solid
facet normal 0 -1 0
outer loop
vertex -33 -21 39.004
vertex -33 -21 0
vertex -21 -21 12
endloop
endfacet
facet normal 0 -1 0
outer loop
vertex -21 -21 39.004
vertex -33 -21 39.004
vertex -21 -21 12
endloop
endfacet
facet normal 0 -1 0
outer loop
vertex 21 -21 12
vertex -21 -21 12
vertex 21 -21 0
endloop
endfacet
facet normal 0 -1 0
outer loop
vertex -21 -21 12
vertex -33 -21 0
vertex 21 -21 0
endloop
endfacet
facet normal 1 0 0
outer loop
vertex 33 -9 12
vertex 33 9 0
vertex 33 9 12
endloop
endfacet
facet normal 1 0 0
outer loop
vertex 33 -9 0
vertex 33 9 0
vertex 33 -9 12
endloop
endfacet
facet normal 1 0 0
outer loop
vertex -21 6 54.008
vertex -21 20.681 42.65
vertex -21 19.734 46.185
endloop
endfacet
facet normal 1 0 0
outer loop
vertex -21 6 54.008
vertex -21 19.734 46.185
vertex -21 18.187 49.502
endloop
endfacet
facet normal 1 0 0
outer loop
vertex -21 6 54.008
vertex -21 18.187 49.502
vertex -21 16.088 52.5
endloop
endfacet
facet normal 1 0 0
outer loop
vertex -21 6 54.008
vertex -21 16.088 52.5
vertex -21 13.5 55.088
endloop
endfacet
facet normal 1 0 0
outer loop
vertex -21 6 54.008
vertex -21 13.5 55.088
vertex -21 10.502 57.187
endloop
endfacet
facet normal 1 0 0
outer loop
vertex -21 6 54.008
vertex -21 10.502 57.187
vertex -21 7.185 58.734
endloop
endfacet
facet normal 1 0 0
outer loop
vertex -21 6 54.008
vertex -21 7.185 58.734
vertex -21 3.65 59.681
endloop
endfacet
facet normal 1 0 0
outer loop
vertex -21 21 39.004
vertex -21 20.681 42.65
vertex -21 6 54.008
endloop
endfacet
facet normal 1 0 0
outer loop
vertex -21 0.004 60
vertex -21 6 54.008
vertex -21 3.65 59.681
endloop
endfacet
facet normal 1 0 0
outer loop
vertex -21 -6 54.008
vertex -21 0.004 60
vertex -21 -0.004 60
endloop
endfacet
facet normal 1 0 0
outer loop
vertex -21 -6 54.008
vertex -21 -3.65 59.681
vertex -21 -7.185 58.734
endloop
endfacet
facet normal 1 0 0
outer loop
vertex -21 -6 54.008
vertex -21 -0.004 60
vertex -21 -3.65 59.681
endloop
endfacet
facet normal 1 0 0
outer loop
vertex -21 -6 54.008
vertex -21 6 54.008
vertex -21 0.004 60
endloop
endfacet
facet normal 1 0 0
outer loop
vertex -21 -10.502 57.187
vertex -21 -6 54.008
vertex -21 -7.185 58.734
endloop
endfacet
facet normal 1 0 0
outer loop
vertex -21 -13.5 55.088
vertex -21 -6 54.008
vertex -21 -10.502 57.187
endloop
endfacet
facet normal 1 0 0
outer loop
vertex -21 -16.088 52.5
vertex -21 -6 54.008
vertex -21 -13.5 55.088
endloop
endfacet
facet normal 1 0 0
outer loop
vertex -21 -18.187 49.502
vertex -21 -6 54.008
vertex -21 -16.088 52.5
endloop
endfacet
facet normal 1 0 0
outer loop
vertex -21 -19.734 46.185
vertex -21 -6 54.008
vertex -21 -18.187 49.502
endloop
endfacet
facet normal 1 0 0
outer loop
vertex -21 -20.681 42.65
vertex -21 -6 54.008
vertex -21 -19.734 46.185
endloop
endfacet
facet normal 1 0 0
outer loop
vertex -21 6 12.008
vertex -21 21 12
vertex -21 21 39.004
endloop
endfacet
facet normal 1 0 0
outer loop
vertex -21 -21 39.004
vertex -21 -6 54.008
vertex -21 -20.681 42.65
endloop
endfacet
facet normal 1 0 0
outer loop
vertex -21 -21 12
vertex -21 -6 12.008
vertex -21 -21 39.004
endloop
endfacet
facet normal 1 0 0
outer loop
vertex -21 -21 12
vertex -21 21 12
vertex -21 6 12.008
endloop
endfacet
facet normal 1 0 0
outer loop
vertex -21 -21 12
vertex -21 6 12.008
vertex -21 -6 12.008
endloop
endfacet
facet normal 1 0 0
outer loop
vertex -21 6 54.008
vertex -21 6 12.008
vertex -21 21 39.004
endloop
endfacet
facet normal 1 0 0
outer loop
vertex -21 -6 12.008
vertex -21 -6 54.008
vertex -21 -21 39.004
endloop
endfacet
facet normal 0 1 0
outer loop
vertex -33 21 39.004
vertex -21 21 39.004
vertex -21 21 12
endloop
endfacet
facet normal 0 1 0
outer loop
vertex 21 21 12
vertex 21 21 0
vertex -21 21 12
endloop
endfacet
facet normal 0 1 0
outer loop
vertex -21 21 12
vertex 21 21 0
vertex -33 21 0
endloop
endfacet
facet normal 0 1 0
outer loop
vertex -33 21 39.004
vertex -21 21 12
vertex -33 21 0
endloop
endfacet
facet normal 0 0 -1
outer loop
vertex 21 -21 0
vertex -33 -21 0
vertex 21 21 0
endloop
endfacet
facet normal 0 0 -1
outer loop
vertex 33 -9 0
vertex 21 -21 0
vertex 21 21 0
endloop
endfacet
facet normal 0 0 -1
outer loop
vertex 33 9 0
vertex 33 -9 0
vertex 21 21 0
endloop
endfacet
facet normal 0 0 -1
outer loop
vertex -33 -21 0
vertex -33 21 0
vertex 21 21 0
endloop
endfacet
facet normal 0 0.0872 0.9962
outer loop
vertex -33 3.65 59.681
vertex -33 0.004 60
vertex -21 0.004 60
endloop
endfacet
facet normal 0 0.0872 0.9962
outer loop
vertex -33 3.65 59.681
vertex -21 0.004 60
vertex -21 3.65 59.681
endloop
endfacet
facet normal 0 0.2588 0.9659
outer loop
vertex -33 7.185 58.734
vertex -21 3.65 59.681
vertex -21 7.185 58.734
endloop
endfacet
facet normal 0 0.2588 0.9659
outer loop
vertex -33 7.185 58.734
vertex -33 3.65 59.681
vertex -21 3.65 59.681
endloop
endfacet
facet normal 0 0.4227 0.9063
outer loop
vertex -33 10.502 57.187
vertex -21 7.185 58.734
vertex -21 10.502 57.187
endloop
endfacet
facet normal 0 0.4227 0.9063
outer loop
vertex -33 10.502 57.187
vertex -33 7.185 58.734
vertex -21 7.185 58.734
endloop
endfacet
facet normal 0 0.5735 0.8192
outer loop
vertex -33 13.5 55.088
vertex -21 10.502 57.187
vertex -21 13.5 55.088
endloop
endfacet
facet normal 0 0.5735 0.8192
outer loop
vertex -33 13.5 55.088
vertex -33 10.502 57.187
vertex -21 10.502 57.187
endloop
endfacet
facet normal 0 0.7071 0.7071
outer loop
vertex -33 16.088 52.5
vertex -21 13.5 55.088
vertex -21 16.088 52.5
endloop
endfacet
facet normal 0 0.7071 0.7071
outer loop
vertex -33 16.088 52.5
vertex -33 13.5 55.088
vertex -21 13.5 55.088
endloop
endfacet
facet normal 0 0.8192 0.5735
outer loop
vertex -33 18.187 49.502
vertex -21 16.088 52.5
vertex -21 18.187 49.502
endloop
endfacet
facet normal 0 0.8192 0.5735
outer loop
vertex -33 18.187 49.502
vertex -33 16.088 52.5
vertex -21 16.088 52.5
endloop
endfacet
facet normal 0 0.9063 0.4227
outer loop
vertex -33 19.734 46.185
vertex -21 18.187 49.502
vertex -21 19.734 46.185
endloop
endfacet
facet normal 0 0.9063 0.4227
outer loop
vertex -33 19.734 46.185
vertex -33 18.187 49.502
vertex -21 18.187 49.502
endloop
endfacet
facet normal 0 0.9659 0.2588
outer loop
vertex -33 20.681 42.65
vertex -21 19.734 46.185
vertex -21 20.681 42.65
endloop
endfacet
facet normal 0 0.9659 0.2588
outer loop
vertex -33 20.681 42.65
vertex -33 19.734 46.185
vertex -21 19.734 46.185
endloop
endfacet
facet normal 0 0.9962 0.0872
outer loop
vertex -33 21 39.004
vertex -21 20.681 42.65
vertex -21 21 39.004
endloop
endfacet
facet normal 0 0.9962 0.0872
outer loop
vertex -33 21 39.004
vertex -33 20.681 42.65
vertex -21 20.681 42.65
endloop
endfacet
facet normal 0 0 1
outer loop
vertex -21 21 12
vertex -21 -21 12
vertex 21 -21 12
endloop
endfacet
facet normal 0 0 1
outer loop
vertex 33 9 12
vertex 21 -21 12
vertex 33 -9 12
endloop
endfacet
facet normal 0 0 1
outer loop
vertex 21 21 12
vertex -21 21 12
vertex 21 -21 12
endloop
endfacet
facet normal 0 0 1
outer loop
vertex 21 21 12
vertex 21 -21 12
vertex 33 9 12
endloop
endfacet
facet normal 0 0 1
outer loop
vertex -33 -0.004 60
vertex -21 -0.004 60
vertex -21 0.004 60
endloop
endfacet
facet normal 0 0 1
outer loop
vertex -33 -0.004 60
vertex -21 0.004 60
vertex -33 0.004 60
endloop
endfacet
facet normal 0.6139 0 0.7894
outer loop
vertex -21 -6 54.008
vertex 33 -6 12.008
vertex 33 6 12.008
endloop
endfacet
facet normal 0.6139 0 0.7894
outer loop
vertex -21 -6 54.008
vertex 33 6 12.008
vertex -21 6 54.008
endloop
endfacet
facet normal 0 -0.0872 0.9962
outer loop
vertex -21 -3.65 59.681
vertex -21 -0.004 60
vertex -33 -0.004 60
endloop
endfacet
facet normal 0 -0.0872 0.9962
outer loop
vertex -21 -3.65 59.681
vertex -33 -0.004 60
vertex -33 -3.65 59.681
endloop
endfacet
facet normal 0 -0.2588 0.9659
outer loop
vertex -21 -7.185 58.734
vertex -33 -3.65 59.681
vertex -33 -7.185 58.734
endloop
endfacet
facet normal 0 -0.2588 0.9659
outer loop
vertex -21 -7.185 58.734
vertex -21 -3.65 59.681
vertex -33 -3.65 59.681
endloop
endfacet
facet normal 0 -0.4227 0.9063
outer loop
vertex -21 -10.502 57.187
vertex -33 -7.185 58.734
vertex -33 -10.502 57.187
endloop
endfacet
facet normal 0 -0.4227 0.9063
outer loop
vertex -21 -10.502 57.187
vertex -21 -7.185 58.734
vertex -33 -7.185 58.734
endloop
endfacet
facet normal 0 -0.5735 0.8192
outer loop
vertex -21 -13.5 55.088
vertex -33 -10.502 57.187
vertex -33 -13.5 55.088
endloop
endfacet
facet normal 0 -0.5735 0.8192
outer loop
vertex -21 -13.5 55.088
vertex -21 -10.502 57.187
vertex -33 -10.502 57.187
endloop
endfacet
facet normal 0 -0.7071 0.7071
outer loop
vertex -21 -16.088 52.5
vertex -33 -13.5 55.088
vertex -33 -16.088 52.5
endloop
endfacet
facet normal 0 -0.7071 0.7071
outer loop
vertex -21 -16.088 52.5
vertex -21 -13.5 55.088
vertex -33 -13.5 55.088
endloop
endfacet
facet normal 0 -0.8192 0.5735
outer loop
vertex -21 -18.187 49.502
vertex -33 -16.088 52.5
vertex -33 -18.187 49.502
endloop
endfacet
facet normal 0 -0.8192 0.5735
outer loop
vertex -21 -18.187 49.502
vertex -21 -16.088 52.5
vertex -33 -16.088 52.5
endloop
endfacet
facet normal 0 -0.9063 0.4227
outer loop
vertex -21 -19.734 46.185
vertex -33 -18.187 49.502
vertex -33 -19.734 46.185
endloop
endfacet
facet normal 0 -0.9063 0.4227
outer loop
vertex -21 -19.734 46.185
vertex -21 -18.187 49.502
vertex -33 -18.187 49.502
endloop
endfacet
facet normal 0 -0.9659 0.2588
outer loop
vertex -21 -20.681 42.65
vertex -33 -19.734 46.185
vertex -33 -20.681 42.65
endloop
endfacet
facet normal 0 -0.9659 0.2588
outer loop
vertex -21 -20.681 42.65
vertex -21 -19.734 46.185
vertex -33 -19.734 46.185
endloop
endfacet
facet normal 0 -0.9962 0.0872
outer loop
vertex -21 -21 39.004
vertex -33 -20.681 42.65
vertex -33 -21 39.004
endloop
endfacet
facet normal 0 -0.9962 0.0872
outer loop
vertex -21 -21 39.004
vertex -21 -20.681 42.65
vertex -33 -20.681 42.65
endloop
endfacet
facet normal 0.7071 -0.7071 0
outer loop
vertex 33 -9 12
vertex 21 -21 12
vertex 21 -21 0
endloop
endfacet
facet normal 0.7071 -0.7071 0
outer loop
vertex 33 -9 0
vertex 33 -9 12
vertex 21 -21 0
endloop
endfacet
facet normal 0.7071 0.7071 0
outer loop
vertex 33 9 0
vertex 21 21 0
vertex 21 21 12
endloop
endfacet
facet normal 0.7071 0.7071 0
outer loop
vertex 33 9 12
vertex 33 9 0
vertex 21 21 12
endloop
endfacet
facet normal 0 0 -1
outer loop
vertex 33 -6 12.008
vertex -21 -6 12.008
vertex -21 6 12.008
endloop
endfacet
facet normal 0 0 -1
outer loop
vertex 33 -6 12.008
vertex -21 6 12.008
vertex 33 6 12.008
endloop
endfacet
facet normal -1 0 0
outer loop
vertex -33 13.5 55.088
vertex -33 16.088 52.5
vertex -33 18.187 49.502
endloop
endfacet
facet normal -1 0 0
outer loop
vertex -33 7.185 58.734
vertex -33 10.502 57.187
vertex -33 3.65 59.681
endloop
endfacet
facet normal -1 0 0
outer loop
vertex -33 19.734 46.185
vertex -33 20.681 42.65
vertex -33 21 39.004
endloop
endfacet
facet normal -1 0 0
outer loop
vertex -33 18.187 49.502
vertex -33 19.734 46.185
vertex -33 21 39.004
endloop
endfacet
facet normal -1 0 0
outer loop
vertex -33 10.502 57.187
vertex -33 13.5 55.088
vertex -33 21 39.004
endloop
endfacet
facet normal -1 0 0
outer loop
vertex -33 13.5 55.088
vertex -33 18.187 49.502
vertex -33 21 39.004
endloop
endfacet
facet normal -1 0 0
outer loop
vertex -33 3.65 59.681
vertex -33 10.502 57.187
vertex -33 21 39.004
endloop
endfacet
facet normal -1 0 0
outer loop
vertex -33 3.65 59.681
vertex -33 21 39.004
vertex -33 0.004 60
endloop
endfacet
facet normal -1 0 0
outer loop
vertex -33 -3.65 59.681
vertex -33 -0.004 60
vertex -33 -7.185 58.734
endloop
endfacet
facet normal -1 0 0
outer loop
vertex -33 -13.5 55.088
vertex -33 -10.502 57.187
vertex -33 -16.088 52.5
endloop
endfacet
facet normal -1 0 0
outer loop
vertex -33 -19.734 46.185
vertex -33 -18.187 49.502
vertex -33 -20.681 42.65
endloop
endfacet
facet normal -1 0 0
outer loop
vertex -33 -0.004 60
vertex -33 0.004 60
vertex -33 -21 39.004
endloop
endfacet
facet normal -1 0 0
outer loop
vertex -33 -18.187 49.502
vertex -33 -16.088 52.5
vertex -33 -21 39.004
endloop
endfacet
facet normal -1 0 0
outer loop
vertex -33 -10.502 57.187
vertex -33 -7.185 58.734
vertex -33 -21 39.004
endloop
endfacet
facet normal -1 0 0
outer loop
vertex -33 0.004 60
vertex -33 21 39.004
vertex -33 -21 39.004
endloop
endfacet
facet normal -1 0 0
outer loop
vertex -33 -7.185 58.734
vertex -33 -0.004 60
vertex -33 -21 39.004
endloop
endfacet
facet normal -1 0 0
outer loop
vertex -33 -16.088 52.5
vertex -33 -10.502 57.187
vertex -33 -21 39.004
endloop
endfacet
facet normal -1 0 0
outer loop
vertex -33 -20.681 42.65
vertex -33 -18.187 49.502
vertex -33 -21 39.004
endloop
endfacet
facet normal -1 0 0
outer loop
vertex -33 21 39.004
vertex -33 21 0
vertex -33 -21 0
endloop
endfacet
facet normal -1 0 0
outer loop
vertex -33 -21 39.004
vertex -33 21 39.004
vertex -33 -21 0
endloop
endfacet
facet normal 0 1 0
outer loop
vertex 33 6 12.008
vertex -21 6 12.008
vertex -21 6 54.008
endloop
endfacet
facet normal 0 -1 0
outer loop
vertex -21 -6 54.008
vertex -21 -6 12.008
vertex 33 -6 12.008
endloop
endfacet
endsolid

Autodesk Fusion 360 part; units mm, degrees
sketch "Base_Sketch" plane through (0, 0, 0) normal (0, 0, 1) x (1, 0, 0)
  line L0 (33, -21) -> (-33, -21)
  line L1 (-33, -21) -> (-33, 21)
  line L2 (-33, 21) -> (33, 21)
  line L3 (33, 21) -> (33, -21)
  line L4 (33, -21) -> (-33, 21) construction
  line L5 (-33, -21) -> (33, 21) construction
  dimension "d1" = 66
  dimension "d2" = 42
extrude "Extrude1" add sketch "Base_Sketch" along normal blind 12
chamfer "Chamfer1" distance 12 angle 45 2 edges at (33, -21, 6) (33, 21, 6)
sketch "Front_Base_Sketch" plane through (0, 0, 12) normal (0, 0, 1) x (-1, 0, 0)
  line L0 (-33, -9) -> (-21, -21)
  line L1 (-21, -21) -> (33, -21)
  line L2 (33, -21) -> (33, 21)
  line L3 (33, 21) -> (-21, 21)
  line L4 (-21, 21) -> (-33, 9)
  line L5 (-33, 9) -> (-33, -9)
  line L6 (33, -21) -> (21, -21)
  line L7 (21, -21) -> (21, 21)
  line L8 (21, 21) -> (33, 21)
  line L9 (33, 21) -> (33, -21)
  dimension "d6" = 12
extrude "Extrude2" add sketch "Front_Base_Sketch" along normal blind 48 contours L1 L2 L3 L6 L7 L8 L9
fillet "Fillet1" radius 21 2 edges at (-27, -21, 60) (-27, 21, 60)
sketch "Triangle_Sketch" plane through (0, 0, 0) normal (0, 1, 0) x (1, 0, 0)
  line L0 (-21, -54.0075) -> (-21, -12.0075)
  line L1 (-21, -12.0075) -> (33, -12.0075)
  line L2 (33, -12.0075) -> (-21, -54.0075)
  dimension "d10" = 42
  dimension "d11" = 54
extrude "Extrude3" add sketch "Triangle_Sketch" along normal mid plane 12
equation "d11 = 66 mm - 12 mm"
